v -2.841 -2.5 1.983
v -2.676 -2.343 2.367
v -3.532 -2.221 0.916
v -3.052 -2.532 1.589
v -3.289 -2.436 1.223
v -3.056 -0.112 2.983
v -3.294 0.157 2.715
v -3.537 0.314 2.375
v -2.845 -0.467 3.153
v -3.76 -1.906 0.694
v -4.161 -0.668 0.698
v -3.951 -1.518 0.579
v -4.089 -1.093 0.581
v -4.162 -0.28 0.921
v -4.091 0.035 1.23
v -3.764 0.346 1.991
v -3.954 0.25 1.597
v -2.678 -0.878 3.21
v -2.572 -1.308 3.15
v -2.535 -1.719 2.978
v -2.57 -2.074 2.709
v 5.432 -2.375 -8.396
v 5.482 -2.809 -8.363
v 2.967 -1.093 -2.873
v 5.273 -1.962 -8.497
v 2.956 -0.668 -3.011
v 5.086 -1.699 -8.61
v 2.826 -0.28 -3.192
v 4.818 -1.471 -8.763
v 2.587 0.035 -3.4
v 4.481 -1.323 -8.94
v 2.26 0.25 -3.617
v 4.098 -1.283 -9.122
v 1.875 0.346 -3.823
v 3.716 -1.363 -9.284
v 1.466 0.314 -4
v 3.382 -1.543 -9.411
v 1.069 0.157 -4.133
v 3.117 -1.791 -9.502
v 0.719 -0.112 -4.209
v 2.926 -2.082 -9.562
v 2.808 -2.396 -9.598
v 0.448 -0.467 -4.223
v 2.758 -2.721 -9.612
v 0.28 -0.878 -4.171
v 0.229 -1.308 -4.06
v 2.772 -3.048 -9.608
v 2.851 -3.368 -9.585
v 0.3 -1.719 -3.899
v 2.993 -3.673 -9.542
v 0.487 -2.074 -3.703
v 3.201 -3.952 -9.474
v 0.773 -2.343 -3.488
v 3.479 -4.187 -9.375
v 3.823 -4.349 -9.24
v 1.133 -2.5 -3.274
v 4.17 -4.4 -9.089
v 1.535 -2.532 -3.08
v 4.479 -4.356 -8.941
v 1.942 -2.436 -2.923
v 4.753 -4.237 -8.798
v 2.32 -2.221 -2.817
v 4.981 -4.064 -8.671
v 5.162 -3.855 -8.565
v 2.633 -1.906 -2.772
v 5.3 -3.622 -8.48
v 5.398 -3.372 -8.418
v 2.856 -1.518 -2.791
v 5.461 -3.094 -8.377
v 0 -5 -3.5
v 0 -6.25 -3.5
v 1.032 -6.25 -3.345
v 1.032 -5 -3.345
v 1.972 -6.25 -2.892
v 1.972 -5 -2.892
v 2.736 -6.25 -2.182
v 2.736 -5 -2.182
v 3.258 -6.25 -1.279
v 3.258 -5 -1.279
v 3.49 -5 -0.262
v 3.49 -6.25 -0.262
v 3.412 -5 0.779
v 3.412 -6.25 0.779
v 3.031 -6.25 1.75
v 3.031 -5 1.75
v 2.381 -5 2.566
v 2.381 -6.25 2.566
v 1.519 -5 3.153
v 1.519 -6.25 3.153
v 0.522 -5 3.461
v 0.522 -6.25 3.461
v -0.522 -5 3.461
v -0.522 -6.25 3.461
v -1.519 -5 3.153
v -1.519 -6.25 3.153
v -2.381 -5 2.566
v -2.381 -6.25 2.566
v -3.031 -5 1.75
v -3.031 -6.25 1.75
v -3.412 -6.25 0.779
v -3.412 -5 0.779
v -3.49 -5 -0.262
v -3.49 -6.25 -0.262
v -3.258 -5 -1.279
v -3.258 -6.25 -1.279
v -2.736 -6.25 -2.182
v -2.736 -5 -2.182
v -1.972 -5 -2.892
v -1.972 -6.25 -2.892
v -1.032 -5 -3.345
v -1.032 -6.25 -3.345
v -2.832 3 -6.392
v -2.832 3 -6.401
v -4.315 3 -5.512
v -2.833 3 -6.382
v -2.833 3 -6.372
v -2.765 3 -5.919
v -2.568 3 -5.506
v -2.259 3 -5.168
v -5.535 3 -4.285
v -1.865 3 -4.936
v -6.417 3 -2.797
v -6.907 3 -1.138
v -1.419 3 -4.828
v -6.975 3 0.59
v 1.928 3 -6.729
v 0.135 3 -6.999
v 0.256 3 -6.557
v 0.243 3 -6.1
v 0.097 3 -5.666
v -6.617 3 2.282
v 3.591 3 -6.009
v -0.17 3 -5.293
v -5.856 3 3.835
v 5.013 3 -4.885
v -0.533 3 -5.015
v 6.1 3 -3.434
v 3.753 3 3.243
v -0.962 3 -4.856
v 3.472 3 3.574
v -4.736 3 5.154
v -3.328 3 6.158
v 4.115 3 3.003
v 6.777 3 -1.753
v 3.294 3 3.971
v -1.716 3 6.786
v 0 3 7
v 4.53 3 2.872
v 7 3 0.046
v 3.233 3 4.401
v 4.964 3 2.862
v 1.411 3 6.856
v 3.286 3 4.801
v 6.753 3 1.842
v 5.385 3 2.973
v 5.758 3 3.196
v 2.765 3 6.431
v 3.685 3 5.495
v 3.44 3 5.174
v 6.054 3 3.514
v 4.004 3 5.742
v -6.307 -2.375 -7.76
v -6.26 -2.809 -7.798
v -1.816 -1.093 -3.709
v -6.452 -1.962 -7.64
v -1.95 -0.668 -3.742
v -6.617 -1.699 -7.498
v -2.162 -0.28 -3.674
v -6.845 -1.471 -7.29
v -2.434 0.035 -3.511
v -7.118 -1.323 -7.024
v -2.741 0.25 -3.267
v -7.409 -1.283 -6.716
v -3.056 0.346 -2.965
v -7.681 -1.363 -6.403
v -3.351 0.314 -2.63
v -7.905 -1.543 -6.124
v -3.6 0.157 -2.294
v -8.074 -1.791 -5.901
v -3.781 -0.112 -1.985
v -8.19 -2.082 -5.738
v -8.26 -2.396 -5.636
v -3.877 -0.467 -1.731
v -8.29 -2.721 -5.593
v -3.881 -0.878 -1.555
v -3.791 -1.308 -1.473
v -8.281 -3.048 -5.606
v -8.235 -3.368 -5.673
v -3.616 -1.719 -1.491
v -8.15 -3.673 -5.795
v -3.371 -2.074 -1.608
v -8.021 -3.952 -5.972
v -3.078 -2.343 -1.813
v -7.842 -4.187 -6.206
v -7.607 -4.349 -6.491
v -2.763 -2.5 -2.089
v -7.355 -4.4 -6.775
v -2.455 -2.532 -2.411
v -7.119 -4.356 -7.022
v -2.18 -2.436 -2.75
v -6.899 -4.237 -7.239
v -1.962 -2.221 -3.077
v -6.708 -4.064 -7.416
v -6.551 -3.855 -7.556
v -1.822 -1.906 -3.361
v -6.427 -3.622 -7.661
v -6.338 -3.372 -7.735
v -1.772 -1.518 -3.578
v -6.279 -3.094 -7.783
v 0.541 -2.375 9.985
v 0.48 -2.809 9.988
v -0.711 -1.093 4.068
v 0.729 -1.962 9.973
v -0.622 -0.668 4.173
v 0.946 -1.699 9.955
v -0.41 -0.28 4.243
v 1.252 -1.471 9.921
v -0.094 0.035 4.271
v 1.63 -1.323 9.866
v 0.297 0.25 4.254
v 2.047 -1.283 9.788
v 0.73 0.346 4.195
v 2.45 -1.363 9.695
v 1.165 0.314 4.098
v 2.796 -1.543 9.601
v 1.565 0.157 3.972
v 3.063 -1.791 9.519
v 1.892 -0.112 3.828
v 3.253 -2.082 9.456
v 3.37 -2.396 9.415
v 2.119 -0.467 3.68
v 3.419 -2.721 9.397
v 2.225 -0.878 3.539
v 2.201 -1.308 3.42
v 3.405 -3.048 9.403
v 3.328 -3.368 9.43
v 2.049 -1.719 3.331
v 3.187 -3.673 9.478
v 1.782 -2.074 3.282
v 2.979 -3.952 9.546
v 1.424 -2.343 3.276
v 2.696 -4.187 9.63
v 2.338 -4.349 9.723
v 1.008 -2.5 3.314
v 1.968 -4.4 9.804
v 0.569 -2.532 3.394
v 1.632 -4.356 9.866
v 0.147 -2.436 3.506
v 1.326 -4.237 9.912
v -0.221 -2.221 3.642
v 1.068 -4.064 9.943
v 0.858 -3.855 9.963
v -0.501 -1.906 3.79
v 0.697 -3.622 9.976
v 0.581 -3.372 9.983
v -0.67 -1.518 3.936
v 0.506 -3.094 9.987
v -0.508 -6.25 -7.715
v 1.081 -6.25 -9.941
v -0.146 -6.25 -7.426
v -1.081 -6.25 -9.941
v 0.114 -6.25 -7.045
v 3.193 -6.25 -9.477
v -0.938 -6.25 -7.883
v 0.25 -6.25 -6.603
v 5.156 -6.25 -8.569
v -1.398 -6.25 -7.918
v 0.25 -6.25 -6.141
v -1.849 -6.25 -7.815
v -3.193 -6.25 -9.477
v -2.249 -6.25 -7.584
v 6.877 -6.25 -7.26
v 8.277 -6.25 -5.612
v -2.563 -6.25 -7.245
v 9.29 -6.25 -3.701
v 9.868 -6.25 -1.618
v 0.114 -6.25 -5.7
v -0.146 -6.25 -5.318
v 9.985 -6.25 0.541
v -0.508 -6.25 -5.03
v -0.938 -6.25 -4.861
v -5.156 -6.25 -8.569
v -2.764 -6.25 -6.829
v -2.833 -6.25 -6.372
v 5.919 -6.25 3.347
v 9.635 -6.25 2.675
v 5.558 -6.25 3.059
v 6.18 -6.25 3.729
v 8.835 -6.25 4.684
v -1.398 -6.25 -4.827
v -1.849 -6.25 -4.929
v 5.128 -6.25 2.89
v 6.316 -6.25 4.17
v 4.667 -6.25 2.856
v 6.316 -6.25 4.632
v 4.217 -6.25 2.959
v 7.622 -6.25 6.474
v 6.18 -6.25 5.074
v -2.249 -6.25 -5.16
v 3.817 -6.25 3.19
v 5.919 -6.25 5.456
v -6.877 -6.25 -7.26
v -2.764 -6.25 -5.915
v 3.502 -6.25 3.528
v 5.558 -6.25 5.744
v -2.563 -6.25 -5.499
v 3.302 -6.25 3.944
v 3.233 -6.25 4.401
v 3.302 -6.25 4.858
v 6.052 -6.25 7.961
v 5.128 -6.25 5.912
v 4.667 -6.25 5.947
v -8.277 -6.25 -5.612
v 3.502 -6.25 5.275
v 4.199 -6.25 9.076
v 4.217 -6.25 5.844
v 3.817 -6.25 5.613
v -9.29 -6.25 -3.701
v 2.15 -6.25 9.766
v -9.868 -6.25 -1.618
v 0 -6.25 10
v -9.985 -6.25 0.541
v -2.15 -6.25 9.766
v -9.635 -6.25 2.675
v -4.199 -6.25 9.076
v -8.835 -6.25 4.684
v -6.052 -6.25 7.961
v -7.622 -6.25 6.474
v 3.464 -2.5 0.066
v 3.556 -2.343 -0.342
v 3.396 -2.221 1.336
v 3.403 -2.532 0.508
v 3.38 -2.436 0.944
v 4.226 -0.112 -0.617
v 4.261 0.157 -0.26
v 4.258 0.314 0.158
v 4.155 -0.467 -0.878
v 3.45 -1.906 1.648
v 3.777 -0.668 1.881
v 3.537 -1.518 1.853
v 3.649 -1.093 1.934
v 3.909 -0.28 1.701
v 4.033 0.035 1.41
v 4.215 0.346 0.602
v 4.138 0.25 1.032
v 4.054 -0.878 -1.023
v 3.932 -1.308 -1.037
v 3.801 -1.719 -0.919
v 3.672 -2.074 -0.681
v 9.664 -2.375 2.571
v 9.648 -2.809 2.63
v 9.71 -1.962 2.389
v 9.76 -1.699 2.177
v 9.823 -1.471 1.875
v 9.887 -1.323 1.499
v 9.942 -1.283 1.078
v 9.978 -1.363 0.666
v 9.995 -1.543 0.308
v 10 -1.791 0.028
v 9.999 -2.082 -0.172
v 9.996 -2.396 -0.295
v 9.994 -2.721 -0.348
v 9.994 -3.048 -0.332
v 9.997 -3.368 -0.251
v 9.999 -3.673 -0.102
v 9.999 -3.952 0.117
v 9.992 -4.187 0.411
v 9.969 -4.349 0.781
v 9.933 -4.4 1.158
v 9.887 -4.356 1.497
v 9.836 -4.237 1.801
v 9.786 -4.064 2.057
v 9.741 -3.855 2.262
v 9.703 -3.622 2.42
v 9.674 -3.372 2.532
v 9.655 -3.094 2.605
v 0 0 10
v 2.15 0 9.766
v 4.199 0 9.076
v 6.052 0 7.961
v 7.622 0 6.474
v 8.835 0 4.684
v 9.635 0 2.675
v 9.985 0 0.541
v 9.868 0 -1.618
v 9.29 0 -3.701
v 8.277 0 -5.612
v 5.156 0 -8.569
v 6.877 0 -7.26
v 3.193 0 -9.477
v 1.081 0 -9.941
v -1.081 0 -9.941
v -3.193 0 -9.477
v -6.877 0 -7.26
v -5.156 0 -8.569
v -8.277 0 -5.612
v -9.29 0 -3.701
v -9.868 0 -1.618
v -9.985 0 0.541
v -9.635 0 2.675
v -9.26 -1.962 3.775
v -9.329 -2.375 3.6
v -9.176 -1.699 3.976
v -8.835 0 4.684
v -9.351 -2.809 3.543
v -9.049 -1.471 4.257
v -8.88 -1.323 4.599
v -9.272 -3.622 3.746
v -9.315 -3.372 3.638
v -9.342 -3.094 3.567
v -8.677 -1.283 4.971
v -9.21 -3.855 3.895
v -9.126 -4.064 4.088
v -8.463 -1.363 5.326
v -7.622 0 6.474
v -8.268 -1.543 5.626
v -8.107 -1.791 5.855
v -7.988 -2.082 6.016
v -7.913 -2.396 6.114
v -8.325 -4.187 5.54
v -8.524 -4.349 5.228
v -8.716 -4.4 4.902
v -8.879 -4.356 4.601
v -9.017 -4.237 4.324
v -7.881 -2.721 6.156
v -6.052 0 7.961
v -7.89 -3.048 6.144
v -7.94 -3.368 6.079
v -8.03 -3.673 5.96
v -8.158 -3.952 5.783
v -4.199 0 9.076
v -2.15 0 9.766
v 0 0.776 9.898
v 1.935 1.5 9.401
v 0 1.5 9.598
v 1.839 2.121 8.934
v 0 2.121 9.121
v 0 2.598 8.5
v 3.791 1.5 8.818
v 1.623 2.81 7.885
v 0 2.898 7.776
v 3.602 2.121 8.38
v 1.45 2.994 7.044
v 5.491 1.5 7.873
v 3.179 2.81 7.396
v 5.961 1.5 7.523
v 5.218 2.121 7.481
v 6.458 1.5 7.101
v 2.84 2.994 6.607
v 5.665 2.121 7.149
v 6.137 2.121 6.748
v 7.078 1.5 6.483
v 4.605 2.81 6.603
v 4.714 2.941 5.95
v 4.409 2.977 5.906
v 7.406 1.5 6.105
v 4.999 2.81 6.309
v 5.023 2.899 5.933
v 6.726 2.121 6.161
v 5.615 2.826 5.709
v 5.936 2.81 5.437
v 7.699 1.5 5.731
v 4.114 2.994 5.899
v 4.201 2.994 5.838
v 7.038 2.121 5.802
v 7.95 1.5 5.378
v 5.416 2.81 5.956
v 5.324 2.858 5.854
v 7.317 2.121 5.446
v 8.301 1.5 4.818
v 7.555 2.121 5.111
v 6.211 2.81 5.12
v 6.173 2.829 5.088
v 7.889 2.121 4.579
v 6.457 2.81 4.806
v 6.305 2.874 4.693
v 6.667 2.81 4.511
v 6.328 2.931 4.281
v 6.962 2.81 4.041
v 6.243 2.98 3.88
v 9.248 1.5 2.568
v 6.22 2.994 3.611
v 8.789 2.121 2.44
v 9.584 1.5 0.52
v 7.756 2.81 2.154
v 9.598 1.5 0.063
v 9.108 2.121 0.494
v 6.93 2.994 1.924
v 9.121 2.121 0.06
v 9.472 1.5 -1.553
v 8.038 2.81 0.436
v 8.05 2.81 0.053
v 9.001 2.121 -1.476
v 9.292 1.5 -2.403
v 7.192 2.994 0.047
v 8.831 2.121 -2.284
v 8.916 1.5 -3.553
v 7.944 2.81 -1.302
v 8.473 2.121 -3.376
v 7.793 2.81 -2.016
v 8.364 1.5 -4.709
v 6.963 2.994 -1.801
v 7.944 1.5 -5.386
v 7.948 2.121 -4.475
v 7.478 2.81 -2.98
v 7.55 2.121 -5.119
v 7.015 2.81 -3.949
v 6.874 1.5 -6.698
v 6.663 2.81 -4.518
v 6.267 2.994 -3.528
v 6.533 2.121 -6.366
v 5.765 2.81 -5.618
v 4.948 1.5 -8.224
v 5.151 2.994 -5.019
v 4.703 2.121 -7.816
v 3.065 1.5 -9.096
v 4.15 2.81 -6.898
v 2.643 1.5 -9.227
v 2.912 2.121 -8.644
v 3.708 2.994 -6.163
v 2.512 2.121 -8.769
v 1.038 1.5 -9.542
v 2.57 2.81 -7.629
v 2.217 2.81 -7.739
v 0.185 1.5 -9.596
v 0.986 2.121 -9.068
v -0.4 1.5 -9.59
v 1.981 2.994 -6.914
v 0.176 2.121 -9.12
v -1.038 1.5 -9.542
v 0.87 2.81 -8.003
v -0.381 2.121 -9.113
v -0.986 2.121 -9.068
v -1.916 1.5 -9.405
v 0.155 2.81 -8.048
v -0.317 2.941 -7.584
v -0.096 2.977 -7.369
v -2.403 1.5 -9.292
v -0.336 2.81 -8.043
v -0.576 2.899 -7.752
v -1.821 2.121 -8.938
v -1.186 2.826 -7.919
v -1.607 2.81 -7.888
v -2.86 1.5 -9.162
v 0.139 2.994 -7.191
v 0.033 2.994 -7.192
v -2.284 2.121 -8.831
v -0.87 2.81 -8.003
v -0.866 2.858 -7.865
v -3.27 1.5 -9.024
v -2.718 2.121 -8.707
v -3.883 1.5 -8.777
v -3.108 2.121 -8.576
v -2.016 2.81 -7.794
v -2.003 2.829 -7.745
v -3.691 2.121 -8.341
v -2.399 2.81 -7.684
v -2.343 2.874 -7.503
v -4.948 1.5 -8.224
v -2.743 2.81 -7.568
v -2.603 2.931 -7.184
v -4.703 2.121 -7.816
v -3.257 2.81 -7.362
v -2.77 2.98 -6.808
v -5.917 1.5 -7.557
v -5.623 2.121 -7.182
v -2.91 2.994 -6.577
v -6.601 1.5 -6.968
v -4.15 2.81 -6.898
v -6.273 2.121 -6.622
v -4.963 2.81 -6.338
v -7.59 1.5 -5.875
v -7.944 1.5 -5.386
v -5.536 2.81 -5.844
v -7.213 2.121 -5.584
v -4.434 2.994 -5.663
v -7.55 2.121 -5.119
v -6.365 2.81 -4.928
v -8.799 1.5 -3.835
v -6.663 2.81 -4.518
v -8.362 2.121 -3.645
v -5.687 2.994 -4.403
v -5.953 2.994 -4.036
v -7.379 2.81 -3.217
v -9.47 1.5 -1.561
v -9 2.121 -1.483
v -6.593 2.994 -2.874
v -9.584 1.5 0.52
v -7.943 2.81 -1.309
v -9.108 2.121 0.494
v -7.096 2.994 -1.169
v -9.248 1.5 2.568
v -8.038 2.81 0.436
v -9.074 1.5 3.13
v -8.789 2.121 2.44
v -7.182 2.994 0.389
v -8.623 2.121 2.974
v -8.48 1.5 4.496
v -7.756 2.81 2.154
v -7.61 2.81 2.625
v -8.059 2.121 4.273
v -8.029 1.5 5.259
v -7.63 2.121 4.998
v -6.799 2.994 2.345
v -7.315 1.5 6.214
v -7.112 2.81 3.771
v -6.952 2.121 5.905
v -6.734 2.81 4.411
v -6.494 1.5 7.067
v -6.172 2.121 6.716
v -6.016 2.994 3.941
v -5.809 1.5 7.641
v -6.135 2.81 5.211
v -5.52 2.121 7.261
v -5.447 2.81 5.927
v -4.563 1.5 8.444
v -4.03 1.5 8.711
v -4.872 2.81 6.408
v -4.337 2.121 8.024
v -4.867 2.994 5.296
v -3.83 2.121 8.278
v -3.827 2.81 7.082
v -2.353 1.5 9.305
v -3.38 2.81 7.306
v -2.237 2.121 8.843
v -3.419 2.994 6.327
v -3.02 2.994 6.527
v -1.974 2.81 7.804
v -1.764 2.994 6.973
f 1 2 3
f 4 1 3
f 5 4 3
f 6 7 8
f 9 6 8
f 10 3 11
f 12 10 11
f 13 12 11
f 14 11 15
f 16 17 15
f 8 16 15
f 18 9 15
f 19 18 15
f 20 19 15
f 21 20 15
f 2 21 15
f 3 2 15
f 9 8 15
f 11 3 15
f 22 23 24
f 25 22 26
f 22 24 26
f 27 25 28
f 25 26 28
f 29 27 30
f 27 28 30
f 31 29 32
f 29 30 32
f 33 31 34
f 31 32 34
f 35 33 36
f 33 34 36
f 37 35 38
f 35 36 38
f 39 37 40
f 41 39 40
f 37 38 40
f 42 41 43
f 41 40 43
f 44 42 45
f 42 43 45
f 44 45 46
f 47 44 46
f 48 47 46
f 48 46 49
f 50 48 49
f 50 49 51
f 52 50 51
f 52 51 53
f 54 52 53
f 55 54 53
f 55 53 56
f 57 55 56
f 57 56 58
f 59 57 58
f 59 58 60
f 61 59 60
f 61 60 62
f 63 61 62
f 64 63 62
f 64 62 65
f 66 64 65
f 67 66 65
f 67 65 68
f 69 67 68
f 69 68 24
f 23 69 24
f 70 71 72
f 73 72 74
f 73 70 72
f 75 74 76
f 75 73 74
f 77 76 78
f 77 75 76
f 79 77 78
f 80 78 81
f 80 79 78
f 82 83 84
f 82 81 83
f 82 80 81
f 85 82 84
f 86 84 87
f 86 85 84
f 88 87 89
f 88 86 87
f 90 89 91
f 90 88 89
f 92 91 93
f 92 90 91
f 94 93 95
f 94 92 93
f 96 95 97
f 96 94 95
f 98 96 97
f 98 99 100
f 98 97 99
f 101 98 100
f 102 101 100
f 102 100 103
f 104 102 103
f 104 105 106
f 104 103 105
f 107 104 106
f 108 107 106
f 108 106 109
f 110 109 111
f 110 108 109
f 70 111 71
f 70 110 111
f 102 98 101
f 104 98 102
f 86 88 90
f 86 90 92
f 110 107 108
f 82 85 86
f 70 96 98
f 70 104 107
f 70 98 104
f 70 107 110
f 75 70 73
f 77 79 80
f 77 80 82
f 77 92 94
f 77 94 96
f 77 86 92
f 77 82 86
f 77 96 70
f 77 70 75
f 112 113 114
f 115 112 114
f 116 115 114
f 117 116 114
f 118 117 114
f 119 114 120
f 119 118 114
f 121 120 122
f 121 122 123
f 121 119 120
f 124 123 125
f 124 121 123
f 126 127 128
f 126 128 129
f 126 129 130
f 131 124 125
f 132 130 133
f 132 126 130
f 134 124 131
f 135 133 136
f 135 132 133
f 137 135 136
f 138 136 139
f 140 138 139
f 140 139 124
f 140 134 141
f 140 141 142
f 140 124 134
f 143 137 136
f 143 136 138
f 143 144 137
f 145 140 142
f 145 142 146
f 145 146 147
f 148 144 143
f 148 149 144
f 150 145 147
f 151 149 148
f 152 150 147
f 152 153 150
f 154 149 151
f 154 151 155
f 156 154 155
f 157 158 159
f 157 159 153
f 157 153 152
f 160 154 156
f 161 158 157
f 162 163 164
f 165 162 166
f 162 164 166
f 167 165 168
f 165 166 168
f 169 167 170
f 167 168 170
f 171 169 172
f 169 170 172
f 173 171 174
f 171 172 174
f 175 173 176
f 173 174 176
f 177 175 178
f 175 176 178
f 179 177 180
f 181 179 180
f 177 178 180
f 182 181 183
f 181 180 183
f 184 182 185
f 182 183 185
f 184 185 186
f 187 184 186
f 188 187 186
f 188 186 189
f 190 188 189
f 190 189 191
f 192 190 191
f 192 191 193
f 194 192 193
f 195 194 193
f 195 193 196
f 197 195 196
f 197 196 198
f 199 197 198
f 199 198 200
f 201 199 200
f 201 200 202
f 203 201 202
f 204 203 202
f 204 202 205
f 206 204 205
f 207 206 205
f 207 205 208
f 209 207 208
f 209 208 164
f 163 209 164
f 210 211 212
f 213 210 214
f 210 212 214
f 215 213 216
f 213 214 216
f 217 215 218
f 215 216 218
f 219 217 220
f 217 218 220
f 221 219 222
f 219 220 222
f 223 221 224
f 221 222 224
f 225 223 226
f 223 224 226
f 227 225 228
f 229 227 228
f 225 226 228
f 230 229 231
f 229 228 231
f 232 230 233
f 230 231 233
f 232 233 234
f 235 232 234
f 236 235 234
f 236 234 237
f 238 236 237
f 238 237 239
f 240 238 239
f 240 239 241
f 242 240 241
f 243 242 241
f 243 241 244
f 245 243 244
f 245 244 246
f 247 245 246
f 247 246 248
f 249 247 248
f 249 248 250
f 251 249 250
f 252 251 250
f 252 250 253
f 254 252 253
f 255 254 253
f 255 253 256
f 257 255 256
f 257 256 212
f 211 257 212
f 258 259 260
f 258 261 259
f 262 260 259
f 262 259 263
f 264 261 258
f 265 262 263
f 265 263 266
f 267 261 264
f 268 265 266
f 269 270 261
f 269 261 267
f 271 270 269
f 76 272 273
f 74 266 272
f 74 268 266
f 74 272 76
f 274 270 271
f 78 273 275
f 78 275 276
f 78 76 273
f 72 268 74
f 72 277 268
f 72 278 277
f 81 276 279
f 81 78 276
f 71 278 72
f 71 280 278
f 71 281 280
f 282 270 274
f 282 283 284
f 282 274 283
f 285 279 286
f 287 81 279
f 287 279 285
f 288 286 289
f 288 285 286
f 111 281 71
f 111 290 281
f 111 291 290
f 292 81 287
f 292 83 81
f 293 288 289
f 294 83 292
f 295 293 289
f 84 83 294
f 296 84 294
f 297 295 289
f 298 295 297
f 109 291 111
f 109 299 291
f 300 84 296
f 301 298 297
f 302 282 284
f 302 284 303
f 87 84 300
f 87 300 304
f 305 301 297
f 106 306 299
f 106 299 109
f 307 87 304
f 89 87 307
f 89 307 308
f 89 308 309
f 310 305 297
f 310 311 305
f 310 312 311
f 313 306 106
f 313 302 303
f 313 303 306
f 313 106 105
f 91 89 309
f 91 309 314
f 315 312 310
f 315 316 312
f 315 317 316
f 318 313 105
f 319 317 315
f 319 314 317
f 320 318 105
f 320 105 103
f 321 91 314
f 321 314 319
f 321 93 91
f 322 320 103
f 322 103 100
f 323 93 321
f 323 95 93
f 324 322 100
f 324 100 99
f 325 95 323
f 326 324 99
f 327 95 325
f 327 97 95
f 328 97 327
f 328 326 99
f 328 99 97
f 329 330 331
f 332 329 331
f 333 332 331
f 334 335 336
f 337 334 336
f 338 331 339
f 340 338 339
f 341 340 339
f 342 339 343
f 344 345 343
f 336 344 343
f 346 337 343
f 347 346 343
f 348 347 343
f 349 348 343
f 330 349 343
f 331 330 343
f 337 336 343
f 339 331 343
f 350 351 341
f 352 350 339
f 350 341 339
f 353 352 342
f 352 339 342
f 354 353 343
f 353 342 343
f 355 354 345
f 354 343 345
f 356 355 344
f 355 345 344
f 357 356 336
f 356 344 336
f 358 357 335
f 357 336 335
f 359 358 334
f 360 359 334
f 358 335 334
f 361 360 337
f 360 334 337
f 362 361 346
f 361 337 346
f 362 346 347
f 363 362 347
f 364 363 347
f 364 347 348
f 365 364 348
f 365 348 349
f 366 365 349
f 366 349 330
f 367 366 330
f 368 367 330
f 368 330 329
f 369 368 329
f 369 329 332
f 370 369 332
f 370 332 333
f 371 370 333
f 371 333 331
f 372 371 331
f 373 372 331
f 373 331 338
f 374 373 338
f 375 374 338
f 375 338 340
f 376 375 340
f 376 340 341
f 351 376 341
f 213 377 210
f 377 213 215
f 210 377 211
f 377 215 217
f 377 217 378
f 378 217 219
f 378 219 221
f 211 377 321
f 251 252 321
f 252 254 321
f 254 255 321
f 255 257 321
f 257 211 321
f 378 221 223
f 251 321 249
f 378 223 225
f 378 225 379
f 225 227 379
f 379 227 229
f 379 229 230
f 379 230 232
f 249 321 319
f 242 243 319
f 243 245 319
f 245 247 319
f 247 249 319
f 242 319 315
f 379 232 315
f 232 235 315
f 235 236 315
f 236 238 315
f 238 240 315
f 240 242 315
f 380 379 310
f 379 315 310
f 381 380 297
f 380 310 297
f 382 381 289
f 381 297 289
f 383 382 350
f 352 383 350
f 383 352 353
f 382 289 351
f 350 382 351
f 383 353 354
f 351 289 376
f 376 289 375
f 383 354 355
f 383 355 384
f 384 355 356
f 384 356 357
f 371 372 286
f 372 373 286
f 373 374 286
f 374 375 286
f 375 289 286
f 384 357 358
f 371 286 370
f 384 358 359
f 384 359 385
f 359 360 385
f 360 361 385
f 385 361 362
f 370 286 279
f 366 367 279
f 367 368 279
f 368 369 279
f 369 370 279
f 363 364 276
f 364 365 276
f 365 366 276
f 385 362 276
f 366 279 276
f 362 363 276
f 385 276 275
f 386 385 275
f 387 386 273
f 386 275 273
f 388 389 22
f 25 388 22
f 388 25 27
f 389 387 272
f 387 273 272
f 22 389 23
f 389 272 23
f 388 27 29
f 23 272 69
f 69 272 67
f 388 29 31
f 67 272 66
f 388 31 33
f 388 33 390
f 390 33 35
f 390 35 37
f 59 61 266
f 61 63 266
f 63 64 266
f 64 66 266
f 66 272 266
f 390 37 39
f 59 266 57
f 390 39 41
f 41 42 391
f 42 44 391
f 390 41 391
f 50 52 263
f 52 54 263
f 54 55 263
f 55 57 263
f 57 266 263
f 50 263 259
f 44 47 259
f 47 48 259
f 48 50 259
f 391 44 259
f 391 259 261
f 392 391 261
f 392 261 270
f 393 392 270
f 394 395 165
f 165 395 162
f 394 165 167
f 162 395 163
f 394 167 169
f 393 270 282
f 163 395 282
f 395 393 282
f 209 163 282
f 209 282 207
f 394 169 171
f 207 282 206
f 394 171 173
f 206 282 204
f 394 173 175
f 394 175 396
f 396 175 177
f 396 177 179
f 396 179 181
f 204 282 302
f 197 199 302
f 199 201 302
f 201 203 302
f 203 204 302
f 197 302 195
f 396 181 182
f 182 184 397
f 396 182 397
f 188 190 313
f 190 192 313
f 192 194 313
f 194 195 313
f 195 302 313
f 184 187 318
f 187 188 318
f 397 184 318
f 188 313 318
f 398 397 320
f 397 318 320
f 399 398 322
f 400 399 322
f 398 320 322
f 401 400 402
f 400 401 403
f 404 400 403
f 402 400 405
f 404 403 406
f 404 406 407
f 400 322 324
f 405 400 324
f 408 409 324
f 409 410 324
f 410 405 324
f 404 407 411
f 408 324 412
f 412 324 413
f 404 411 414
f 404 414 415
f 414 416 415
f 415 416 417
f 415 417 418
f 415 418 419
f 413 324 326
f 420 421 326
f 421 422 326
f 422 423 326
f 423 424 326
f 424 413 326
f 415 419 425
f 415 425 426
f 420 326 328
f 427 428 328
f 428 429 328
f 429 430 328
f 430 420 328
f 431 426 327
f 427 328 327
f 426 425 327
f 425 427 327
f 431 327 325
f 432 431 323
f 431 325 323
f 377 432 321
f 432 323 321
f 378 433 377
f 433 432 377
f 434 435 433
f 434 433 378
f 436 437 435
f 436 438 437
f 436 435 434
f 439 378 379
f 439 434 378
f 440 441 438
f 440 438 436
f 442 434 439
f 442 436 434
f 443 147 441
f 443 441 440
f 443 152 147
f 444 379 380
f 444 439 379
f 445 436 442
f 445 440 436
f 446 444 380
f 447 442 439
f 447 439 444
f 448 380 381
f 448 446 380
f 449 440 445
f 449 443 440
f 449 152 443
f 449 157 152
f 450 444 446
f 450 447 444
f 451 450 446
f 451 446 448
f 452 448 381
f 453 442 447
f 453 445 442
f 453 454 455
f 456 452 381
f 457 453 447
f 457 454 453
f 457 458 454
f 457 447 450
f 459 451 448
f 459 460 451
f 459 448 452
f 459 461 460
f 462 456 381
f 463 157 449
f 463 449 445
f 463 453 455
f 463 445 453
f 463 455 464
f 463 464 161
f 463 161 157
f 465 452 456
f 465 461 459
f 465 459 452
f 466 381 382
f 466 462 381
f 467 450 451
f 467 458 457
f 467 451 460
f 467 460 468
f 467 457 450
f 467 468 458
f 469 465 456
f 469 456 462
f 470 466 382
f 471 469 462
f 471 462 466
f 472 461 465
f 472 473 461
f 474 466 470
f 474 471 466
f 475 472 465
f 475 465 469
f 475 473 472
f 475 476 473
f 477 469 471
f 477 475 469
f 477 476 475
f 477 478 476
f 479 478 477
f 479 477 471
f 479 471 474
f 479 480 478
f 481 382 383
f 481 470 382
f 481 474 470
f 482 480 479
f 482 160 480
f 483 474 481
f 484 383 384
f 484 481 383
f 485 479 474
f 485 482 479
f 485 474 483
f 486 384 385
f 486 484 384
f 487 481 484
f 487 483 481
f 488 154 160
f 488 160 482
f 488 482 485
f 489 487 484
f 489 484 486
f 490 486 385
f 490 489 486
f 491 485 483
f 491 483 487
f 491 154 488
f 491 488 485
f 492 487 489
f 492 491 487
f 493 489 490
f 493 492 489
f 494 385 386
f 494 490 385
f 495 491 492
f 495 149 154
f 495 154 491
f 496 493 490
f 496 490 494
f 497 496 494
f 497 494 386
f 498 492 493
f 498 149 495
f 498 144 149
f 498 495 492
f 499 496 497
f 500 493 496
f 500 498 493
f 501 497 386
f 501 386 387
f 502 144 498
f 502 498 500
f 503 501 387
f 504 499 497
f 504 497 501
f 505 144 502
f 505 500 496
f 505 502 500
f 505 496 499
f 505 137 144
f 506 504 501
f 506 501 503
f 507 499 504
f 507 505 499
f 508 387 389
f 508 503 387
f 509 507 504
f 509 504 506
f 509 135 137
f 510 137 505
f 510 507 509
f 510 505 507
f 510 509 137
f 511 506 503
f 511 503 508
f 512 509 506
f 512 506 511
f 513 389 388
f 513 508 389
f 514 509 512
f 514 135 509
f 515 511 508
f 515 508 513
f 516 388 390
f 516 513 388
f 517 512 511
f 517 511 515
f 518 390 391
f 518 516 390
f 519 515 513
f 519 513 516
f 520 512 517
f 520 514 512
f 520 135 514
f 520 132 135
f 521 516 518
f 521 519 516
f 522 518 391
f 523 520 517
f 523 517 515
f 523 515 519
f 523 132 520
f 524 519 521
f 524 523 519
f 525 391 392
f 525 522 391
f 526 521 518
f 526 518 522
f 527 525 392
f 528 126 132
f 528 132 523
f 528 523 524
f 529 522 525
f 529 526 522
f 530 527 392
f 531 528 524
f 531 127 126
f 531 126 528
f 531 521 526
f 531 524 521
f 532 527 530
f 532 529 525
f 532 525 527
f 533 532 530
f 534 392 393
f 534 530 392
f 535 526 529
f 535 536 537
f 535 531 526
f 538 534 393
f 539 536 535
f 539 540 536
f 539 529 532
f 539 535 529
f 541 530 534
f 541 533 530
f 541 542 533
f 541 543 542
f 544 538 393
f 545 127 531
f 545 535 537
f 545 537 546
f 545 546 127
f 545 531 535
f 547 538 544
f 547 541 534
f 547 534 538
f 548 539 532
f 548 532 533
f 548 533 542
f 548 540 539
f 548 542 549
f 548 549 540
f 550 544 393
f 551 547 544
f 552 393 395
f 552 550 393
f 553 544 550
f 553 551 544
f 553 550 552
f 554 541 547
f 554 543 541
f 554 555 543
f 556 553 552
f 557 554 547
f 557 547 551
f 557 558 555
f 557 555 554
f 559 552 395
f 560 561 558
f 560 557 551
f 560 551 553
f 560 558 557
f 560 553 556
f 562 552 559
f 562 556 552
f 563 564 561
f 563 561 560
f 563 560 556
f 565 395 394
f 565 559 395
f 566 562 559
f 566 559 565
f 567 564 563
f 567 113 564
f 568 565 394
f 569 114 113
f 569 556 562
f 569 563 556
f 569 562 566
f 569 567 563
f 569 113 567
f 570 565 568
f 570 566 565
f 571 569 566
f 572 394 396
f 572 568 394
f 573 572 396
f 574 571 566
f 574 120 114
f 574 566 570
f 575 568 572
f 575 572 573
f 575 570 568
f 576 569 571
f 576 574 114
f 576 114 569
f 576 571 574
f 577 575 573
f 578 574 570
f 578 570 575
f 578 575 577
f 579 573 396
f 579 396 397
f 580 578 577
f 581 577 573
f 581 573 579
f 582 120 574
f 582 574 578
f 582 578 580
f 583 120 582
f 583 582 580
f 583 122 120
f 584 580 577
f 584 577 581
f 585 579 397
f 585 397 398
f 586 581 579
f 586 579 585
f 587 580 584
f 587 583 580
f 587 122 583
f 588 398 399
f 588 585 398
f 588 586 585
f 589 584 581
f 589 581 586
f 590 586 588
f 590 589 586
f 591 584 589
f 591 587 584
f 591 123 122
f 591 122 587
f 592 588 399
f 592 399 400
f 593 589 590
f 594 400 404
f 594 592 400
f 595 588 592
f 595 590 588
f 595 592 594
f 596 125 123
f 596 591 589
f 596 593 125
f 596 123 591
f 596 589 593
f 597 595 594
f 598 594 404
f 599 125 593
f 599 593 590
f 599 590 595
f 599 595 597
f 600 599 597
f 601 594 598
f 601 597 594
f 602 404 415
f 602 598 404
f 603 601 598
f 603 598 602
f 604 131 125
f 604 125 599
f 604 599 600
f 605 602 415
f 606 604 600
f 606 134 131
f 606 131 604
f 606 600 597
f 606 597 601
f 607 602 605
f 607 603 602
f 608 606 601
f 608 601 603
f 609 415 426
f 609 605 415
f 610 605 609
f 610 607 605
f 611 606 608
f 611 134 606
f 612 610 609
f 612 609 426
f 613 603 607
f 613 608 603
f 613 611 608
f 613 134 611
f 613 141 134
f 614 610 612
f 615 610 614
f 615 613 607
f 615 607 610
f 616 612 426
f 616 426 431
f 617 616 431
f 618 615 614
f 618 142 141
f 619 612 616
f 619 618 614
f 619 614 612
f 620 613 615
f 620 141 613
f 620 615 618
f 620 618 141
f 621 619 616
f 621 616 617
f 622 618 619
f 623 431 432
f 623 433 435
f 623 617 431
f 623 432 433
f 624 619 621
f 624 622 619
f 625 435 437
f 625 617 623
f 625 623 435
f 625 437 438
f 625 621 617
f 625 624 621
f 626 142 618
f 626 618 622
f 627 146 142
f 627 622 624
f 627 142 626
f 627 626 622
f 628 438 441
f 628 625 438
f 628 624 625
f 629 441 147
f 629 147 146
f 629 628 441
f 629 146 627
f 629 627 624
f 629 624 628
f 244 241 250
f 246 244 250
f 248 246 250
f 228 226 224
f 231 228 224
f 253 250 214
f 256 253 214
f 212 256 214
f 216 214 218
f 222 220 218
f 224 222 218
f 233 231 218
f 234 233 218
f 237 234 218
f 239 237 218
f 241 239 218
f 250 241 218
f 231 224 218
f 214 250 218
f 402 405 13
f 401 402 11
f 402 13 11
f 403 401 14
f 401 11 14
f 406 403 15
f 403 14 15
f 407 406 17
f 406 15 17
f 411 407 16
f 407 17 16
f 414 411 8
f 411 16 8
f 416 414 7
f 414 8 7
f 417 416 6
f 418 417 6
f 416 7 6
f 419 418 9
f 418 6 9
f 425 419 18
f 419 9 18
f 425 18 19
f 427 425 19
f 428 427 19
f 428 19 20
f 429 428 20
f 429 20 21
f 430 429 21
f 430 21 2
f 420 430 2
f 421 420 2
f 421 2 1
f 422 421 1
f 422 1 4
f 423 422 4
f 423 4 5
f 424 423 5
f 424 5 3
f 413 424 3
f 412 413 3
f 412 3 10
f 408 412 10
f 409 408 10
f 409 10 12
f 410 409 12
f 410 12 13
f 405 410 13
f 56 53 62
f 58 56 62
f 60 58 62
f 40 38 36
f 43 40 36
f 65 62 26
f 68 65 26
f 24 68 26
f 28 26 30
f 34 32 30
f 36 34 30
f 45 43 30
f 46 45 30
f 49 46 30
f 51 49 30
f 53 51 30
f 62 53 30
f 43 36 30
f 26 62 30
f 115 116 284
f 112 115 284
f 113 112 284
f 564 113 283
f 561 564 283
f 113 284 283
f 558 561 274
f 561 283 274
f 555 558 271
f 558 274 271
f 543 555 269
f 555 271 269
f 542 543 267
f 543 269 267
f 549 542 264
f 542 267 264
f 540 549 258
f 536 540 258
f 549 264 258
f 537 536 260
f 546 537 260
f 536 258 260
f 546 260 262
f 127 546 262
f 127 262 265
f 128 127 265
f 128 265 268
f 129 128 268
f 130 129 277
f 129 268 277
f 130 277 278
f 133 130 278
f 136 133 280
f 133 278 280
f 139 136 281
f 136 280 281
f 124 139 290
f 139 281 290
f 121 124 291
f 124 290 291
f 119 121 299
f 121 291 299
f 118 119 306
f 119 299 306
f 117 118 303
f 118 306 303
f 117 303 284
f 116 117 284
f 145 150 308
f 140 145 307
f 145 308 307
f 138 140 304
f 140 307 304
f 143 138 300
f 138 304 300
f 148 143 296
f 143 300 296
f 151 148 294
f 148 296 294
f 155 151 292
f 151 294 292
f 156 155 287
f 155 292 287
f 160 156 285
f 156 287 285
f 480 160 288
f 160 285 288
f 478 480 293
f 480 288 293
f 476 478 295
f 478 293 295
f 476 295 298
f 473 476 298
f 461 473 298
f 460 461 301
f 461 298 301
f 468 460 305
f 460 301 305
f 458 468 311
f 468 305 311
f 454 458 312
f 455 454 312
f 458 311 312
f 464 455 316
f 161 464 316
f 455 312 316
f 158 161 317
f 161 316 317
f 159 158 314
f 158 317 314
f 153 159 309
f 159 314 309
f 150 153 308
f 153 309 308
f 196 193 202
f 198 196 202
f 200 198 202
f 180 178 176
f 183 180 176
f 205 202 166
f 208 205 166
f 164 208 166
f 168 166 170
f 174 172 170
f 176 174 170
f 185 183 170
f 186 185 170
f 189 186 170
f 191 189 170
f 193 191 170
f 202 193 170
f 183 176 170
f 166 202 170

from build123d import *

# Parameters (mm, degrees)
BOSS_EXTRUDE1_DEPTH        = 3
BOSS_EXTRUDE1_DEPTH_BACK   = 10
SKETCH1_R                  = 10
SKETCH4_R                  = 1.5
HOLE_DEPTH                 = 20.973741561
HOLECIR_COUNT              = 5
SKETCH6_R                  = 3.5
BEARINGHOLE_DEPTH          = 2.5
SKETCH7_R                  = 2
SHAFTHOLE_DEPTH            = 17.248076982
F_3_1_3_1_DIAMETER_HOLE1_D = 3.1
FILLET2_R                  = 3
CUT_EXTRUDE1_START         = 10
SKETCH11_R                 = 10
CUT_EXTRUDE1_DEPTH         = 10


with BuildPart() as part:
    # Sketch1 → Boss-Extrude1 (new, two sides: drawn at the far end of the back side and taken through both)
    with BuildSketch(Plane(origin=(0, 0, 0), x_dir=(1, 0, 0), z_dir=(0, 1, 0)).offset(-BOSS_EXTRUDE1_DEPTH_BACK)):
        with Locations(Location((0, 0, 0), (0, 0, 270))):
            Circle(SKETCH1_R)
    extrude(amount=BOSS_EXTRUDE1_DEPTH + BOSS_EXTRUDE1_DEPTH_BACK)

    # Sketch4 → hole (cut, through all)
    with BuildSketch(Plane(origin=(-3.352872105, -1.093066116, 1.887711608), x_dir=(-0.4486862613641547, -0.14627571033740308, -0.8816371449912632), z_dir=(0.8382180262940947, 0.2732665289126682, -0.47192790187872385))):
        with Locations(Location((0, 0, 0), (0, 0, 8.746528197))):
            Circle(SKETCH4_R)
    hole = extrude(amount=-HOLE_DEPTH, mode=Mode.SUBTRACT)

    # holecir: hole ×5 about axis
    holecir_axis = Axis((0, 0, 0), (0, 1, 0))
    for i in range(1, HOLECIR_COUNT):
        add(hole.rotate(holecir_axis, i * 360 / HOLECIR_COUNT), mode=Mode.SUBTRACT)

    # Sketch6 → bearinghole (cut)
    with BuildSketch(Plane(origin=(0, -5, 0), x_dir=(-1, 0, 0), z_dir=(0, -1, 0))):
        with Locations(Location((0, 0, 0), (0, 0, 90))):
            Circle(SKETCH6_R)
    extrude(amount=BEARINGHOLE_DEPTH, mode=Mode.SUBTRACT)

    # Sketch7 → shafthole (cut, through all)
    with BuildSketch(Plane(origin=(0, -5, 0), x_dir=(-1, 0, 0), z_dir=(0, -1, 0))):
        with Locations(Location((0, 0, 0), (0, 0, 90))):
            Circle(SKETCH7_R)
    extrude(amount=SHAFTHOLE_DEPTH, mode=Mode.SUBTRACT)

    # Ø3.1 (3.1) Diameter Hole1 (through all)
    with Locations(Plane(origin=(0, 3, 0), x_dir=(1, 0, 0), z_dir=(0, 1, 0))):
        with Locations((-1.282558474, 6.372208703), (4.783101903, -4.401356176)):
            Hole(F_3_1_3_1_DIAMETER_HOLE1_D / 2)

    # Fillet2
    # the kernel refuses this fillet: 3 mm, written as the material it takes off along each edge
    with BuildSketch(Plane(origin=(0, 3, 0), x_dir=(0, 0, 1), z_dir=(-1, 0, 0))) as fillet2_piece_1:
        with BuildLine():
            CenterArc((10 - FILLET2_R, -FILLET2_R), FILLET2_R, 0, 90)
            Line((10 - FILLET2_R, 0), (10, 0))
            Line((10, 0), (10, -FILLET2_R))
        make_face()
    revolve(axis=Axis((0, 3, 0), (0, 1, 0)), mode=Mode.SUBTRACT)
    with BuildSketch(Plane(origin=(0, -10, 0), x_dir=(0, 0, 1), z_dir=(-1, 0, 0))) as fillet2_piece_2:
        with BuildLine():
            CenterArc((10 - FILLET2_R, FILLET2_R), FILLET2_R, 270, 90)
            Line((10 - FILLET2_R, 0), (10, 0))
            Line((10, 0), (10, FILLET2_R))
        make_face()
    revolve(axis=Axis((0, -10, 0), (0, 1, 0)), mode=Mode.SUBTRACT)

    # Sketch11 → Cut-Extrude1 (cut)
    with BuildSketch(Plane(origin=(0, -6.25, 0), x_dir=(-1, 0, 0), z_dir=(0, -1, 0)).offset(CUT_EXTRUDE1_START)):
        with Locations(Location((0, 0, 0), (0, 0, 270))):
            Circle(SKETCH11_R)
    extrude(amount=-CUT_EXTRUDE1_DEPTH, mode=Mode.SUBTRACT)


solid = part.part
